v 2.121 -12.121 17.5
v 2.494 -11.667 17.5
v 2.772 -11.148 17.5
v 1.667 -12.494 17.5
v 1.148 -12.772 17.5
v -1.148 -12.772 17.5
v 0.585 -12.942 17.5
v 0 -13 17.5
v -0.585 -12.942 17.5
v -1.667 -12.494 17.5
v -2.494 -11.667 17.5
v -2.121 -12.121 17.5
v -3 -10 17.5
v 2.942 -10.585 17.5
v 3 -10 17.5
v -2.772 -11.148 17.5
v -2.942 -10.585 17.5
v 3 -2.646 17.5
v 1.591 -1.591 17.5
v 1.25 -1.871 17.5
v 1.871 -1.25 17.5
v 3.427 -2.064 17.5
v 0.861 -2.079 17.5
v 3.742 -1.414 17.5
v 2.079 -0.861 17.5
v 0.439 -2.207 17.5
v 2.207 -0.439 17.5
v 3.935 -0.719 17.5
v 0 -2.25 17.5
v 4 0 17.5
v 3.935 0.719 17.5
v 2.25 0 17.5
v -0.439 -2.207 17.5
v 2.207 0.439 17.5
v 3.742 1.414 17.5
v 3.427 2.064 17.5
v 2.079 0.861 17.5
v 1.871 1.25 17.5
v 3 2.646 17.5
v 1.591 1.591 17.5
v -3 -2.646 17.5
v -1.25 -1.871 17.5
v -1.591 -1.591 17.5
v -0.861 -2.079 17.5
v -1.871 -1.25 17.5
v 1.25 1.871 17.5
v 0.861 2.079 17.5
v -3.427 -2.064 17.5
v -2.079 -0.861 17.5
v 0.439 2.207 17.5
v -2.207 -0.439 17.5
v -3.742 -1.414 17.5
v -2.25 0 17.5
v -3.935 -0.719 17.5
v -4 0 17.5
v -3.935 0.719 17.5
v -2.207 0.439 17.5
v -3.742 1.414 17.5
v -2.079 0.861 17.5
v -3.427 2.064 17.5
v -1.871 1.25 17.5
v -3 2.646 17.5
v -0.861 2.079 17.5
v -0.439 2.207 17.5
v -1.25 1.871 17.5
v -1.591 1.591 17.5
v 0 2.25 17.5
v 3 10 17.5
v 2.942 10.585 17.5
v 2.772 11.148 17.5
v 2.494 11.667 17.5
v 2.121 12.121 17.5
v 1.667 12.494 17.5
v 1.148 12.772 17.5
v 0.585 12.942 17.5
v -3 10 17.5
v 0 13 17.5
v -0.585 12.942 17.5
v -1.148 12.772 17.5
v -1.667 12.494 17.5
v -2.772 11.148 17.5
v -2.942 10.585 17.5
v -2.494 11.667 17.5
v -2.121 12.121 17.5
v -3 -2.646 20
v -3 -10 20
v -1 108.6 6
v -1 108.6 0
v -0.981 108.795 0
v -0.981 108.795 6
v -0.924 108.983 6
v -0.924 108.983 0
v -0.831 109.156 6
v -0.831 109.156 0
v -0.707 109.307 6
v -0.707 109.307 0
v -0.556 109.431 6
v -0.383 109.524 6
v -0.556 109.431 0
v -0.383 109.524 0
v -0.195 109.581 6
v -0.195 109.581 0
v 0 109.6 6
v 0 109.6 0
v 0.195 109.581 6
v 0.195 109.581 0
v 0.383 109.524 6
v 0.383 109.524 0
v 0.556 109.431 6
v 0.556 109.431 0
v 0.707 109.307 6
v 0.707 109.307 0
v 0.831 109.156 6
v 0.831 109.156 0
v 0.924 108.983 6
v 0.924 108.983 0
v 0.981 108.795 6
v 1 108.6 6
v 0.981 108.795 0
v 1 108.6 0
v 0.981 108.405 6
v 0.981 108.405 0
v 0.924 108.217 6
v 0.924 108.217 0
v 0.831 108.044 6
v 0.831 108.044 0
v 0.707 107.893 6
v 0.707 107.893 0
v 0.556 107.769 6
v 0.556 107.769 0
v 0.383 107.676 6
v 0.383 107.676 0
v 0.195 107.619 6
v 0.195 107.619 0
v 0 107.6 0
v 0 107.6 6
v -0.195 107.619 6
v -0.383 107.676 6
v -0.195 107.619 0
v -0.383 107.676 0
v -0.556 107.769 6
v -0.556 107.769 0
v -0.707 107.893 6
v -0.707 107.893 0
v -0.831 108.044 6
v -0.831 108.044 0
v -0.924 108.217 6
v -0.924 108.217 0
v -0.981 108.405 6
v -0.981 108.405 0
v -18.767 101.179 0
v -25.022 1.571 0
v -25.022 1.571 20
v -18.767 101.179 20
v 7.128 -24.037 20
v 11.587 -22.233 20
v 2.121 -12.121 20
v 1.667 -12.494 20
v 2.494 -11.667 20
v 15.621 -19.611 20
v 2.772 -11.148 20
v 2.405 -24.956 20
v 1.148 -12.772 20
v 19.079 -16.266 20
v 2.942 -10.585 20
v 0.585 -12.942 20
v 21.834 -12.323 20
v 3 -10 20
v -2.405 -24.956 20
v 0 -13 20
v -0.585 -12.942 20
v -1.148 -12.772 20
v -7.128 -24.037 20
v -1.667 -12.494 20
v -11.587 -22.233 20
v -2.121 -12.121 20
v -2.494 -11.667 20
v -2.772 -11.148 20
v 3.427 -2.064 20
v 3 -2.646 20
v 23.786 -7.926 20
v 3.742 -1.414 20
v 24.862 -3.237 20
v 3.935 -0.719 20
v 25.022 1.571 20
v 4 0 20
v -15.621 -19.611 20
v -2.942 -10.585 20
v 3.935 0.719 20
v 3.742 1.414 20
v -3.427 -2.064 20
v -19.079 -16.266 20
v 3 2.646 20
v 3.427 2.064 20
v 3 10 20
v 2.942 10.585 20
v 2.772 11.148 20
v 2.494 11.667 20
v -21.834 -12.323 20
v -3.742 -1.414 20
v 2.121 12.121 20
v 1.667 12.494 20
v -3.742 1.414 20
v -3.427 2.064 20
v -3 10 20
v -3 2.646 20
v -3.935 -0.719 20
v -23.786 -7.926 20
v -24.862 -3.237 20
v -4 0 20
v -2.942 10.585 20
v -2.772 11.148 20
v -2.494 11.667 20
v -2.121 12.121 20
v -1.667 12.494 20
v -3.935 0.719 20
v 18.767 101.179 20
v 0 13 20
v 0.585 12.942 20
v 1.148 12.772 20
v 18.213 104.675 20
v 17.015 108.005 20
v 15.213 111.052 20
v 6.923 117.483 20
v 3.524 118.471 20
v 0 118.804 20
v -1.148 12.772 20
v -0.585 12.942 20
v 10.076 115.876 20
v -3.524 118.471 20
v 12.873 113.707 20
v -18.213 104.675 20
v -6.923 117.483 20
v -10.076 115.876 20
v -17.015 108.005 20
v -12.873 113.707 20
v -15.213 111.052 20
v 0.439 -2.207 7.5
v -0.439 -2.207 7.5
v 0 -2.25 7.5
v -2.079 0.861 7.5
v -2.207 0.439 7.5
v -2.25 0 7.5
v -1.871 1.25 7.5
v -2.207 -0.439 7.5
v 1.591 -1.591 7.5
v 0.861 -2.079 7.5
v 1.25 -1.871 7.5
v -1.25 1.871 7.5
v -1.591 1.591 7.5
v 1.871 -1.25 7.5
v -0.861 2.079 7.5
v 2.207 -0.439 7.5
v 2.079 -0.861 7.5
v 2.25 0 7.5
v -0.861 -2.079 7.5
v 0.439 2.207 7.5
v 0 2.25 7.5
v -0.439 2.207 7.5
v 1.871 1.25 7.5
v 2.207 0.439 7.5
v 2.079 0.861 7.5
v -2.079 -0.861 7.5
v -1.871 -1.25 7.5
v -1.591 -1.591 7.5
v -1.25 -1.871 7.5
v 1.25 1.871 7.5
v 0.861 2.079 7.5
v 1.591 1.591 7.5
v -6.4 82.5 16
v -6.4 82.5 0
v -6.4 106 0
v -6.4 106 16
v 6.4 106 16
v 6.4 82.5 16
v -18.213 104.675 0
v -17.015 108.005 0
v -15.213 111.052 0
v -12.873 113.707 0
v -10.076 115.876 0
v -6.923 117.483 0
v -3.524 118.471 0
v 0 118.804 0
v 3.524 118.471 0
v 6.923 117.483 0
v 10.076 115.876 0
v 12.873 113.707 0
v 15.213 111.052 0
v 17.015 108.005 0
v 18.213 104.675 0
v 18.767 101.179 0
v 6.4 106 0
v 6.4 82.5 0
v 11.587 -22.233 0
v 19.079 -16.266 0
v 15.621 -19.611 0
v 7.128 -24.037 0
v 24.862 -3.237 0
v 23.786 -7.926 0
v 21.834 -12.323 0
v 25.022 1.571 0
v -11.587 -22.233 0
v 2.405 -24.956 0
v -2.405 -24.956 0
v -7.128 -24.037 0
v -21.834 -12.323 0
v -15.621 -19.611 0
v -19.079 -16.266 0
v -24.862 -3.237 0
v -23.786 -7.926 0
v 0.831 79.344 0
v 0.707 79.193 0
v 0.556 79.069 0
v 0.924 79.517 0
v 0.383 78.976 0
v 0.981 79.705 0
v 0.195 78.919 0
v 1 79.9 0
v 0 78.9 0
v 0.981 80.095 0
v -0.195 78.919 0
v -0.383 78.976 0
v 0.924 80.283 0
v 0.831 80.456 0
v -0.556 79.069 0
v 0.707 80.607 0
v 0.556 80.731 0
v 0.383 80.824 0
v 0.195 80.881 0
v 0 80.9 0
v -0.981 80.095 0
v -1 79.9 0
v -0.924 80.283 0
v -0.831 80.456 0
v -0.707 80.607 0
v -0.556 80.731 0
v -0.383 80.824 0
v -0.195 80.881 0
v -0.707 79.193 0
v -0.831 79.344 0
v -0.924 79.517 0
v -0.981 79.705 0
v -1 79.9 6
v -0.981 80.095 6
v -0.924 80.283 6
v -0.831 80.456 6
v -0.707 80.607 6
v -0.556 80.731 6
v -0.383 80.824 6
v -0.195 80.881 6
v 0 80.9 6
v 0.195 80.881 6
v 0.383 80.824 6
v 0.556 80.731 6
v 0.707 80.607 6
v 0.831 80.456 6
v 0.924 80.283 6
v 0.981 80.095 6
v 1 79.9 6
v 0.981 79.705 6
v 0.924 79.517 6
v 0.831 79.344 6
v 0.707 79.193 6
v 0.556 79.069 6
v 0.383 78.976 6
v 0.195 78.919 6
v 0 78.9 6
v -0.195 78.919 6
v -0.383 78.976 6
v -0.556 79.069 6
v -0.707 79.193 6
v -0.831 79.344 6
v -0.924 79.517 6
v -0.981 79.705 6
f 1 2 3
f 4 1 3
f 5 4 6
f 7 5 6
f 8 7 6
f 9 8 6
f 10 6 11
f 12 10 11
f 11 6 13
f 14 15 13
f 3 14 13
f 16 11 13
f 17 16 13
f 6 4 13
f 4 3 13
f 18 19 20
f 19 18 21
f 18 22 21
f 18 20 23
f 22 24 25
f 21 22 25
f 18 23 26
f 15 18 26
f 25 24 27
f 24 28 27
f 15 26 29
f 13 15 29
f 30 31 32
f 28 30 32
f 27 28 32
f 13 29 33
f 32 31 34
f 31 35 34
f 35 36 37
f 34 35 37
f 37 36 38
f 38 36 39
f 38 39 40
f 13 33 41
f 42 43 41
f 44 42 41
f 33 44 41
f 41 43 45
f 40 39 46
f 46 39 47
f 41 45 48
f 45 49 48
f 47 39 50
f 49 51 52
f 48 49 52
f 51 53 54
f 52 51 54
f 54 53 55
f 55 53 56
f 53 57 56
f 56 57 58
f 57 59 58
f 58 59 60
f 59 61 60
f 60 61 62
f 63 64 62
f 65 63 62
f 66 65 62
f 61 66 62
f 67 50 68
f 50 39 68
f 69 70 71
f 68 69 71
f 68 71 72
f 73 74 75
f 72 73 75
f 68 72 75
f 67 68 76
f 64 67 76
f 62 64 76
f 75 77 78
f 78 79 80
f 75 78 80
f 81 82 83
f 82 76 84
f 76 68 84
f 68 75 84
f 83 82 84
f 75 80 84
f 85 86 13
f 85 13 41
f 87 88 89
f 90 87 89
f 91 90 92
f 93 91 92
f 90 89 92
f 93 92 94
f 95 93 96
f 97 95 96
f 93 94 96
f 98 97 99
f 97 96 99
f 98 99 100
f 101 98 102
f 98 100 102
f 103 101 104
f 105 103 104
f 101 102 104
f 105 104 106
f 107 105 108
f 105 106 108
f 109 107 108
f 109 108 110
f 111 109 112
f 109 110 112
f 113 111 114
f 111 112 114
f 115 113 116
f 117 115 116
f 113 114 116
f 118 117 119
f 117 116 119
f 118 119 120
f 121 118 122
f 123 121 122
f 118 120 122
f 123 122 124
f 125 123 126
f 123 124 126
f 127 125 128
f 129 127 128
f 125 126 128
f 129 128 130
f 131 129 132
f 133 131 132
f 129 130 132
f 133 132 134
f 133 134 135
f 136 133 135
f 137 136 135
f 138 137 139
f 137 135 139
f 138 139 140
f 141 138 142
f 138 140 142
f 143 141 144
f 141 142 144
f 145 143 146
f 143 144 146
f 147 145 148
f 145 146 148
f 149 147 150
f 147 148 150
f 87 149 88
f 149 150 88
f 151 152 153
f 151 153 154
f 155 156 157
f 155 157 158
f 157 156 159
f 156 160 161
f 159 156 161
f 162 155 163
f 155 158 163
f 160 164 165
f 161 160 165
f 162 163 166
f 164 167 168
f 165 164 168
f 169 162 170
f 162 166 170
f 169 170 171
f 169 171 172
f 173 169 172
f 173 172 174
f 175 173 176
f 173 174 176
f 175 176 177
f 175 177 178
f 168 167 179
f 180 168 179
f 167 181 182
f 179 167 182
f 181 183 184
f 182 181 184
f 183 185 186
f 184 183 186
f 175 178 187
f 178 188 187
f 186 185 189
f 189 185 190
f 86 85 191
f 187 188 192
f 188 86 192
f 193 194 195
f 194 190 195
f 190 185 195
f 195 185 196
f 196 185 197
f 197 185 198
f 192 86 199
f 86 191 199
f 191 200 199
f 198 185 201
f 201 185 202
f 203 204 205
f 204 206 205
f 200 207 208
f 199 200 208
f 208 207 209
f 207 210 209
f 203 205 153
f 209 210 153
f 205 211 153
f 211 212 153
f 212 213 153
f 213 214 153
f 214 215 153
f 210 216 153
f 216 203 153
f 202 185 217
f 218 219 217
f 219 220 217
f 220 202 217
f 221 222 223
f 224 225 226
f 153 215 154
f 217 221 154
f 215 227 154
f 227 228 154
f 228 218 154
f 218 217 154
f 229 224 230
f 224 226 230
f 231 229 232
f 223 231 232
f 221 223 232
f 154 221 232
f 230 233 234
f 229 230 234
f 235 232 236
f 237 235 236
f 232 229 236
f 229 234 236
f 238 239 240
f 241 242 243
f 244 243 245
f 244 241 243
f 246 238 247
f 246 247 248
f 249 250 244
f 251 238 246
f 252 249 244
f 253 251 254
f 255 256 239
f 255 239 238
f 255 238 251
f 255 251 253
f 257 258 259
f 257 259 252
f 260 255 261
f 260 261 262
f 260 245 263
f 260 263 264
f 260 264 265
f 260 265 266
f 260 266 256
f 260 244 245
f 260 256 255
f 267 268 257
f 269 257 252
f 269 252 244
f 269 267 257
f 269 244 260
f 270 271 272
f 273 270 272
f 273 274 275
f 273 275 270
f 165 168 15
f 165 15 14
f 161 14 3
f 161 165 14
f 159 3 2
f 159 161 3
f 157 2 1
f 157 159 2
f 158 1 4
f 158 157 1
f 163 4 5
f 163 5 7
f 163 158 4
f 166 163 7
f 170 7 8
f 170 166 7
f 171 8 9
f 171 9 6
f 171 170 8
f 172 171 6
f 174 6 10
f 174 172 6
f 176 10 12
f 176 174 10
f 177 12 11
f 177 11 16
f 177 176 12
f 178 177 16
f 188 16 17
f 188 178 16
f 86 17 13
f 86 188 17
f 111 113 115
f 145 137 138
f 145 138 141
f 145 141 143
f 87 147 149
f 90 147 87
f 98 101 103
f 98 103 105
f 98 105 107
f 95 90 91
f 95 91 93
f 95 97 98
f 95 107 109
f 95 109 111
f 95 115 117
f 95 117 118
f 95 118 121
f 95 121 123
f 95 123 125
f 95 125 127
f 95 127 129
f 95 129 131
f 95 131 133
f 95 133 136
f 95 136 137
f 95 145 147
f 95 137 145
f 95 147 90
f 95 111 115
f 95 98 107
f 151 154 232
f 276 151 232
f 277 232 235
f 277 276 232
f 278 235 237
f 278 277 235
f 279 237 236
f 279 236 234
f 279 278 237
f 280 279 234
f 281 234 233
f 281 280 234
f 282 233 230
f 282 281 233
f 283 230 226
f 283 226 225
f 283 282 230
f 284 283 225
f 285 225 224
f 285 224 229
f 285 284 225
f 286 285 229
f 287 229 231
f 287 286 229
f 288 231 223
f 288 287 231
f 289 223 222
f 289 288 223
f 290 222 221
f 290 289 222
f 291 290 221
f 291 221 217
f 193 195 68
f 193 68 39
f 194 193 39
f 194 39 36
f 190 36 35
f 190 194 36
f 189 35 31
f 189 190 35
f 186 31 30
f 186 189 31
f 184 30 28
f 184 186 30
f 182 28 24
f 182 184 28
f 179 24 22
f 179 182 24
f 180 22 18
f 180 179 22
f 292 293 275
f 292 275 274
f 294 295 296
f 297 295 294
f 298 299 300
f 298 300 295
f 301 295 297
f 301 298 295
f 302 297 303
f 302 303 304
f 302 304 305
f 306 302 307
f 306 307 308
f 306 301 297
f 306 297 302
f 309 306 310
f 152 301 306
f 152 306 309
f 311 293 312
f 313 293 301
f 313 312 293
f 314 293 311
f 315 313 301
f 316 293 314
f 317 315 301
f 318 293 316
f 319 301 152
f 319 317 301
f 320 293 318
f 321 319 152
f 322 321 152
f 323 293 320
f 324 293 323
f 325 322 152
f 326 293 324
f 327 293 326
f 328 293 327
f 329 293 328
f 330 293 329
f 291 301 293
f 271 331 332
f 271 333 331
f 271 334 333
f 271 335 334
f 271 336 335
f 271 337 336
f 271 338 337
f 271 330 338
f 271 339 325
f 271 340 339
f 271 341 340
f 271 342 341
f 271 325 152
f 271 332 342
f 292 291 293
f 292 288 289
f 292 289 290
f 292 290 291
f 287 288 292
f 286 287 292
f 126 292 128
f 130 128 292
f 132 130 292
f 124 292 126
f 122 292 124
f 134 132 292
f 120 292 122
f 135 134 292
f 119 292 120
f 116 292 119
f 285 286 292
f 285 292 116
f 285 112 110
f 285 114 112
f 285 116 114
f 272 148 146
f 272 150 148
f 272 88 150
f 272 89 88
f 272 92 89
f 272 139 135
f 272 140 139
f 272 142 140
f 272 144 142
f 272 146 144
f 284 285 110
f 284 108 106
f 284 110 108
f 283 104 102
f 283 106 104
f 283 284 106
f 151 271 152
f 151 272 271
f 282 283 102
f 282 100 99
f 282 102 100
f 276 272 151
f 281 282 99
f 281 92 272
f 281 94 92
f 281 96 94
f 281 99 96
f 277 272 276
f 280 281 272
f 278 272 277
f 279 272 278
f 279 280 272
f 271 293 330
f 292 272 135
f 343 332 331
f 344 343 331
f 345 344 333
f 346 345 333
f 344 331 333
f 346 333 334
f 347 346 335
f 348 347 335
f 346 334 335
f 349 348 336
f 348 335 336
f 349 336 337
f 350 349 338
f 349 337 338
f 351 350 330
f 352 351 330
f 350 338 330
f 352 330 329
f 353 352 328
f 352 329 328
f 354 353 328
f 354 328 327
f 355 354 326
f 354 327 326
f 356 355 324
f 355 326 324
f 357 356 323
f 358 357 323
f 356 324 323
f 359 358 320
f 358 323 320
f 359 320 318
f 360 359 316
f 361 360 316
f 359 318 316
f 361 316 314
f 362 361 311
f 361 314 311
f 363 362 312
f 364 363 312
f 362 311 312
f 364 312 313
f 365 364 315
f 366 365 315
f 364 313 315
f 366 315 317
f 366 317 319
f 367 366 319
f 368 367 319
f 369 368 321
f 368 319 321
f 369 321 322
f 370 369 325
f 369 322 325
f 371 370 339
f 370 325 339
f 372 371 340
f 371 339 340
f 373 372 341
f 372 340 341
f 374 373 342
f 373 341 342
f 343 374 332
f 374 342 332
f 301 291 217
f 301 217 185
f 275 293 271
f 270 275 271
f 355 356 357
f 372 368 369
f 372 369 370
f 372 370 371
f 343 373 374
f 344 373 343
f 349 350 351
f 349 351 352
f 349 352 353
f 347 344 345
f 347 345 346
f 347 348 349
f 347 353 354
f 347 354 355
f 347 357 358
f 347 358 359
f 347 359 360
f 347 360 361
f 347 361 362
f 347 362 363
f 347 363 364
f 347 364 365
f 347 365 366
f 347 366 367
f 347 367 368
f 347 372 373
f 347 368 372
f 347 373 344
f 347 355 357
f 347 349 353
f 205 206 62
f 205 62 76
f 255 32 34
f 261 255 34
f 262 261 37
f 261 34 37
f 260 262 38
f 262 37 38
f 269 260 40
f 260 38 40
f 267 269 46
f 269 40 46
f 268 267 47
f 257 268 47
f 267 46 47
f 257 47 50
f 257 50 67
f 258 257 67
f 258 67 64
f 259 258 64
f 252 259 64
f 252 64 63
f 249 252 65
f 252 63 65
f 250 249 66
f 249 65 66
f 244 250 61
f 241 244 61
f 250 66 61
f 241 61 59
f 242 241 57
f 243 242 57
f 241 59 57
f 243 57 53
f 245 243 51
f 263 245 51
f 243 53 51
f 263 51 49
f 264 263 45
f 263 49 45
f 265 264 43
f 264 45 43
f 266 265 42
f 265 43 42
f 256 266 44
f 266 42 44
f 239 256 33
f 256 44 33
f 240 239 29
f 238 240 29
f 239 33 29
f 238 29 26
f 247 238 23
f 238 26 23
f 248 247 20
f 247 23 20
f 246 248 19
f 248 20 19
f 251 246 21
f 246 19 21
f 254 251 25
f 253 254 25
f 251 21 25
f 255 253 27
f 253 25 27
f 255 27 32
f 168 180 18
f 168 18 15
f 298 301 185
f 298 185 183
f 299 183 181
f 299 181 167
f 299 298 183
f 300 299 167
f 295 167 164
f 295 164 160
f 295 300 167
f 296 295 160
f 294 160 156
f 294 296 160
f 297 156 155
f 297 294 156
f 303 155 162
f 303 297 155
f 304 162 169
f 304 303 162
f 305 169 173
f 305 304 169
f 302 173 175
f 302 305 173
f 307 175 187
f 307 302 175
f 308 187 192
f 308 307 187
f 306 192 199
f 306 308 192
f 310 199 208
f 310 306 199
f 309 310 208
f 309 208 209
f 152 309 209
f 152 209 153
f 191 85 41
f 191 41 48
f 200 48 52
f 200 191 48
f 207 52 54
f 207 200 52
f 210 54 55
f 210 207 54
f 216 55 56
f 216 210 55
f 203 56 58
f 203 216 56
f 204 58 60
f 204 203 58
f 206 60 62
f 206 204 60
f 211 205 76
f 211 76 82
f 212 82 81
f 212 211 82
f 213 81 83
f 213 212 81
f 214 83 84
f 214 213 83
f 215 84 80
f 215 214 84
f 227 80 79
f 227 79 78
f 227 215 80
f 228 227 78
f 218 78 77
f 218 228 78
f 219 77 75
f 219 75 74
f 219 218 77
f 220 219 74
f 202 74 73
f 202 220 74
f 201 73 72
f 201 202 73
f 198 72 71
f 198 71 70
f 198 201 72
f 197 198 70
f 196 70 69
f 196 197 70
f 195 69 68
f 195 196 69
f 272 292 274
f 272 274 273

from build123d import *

# Parameters (mm, degrees)
BOSS_EXTRUDE1_DEPTH = 20
CUT_EXTRUDE1_DEPTH  = 2.5
SKETCH4_R           = 2.25
CUT_EXTRUDE2_DEPTH  = 10
SKETCH5_W           = 12.8
SKETCH5_H           = 23.5
CUT_EXTRUDE3_DEPTH  = 16
SKETCH6_R           = 1
CUT_EXTRUDE4_DEPTH  = 6


with BuildPart() as part:
    # Sketch2 → Boss-Extrude1 (new body)
    with BuildSketch(Plane.XY):
        with BuildLine():
            Line((18.766775804, 101.178603266), (25.022367739, 1.571471021))
            ThreePointArc((25.022367739, 1.571471021), (0, -25.07166545), (-25.022367739, 1.571471021))
            Line((-25.022367739, 1.571471021), (-18.766775804, 101.178603266))
            ThreePointArc((-18.766775804, 101.178603266), (0, 118.803749087), (18.766775804, 101.178603266))
        make_face()
    extrude(amount=BOSS_EXTRUDE1_DEPTH)

    # Sketch3 → Cut-Extrude1 (cut)
    with BuildSketch(Plane.XY.offset(20)):
        with BuildLine():
            Line((-3, -10), (-3, -2.645751311))
            ThreePointArc((-3, -2.645751311), (-4, 0), (-3, 2.645751311))
            Line((-3, 2.645751311), (-3, 10))
            ThreePointArc((-3, 10), (0, 13), (3, 10))
            Line((3, 10), (3, 2.645751311))
            ThreePointArc((3, 2.645751311), (4, 0), (3, -2.645751311))
            Line((3, -2.645751311), (3, -10))
            ThreePointArc((3, -10), (0, -13), (-3, -10))
        make_face()
    extrude(amount=-CUT_EXTRUDE1_DEPTH, mode=Mode.SUBTRACT)

    # Sketch4 → Cut-Extrude2 (cut)
    with BuildSketch(Plane.XY.offset(17.5)):
        Circle(SKETCH4_R)
    extrude(amount=-CUT_EXTRUDE2_DEPTH, mode=Mode.SUBTRACT)

    # Sketch5 → Cut-Extrude3 (cut)
    with BuildSketch(Plane(origin=(0, 0, 0), x_dir=(-1, 0, 0), z_dir=(0, 0, -1))):
        with Locations((0, 94.25)):
            Rectangle(SKETCH5_W, SKETCH5_H)
    extrude(amount=-CUT_EXTRUDE3_DEPTH, mode=Mode.SUBTRACT)

    # Sketch6 → Cut-Extrude4 (cut)
    with BuildSketch(Plane(origin=(0, 0, 0), x_dir=(-1, 0, 0), z_dir=(0, 0, -1))):
        with Locations((0, 108.6)):
            Circle(SKETCH6_R)
        with Locations((0, 79.9)):
            Circle(SKETCH6_R)
    extrude(amount=-CUT_EXTRUDE4_DEPTH, mode=Mode.SUBTRACT)


solid = part.part
